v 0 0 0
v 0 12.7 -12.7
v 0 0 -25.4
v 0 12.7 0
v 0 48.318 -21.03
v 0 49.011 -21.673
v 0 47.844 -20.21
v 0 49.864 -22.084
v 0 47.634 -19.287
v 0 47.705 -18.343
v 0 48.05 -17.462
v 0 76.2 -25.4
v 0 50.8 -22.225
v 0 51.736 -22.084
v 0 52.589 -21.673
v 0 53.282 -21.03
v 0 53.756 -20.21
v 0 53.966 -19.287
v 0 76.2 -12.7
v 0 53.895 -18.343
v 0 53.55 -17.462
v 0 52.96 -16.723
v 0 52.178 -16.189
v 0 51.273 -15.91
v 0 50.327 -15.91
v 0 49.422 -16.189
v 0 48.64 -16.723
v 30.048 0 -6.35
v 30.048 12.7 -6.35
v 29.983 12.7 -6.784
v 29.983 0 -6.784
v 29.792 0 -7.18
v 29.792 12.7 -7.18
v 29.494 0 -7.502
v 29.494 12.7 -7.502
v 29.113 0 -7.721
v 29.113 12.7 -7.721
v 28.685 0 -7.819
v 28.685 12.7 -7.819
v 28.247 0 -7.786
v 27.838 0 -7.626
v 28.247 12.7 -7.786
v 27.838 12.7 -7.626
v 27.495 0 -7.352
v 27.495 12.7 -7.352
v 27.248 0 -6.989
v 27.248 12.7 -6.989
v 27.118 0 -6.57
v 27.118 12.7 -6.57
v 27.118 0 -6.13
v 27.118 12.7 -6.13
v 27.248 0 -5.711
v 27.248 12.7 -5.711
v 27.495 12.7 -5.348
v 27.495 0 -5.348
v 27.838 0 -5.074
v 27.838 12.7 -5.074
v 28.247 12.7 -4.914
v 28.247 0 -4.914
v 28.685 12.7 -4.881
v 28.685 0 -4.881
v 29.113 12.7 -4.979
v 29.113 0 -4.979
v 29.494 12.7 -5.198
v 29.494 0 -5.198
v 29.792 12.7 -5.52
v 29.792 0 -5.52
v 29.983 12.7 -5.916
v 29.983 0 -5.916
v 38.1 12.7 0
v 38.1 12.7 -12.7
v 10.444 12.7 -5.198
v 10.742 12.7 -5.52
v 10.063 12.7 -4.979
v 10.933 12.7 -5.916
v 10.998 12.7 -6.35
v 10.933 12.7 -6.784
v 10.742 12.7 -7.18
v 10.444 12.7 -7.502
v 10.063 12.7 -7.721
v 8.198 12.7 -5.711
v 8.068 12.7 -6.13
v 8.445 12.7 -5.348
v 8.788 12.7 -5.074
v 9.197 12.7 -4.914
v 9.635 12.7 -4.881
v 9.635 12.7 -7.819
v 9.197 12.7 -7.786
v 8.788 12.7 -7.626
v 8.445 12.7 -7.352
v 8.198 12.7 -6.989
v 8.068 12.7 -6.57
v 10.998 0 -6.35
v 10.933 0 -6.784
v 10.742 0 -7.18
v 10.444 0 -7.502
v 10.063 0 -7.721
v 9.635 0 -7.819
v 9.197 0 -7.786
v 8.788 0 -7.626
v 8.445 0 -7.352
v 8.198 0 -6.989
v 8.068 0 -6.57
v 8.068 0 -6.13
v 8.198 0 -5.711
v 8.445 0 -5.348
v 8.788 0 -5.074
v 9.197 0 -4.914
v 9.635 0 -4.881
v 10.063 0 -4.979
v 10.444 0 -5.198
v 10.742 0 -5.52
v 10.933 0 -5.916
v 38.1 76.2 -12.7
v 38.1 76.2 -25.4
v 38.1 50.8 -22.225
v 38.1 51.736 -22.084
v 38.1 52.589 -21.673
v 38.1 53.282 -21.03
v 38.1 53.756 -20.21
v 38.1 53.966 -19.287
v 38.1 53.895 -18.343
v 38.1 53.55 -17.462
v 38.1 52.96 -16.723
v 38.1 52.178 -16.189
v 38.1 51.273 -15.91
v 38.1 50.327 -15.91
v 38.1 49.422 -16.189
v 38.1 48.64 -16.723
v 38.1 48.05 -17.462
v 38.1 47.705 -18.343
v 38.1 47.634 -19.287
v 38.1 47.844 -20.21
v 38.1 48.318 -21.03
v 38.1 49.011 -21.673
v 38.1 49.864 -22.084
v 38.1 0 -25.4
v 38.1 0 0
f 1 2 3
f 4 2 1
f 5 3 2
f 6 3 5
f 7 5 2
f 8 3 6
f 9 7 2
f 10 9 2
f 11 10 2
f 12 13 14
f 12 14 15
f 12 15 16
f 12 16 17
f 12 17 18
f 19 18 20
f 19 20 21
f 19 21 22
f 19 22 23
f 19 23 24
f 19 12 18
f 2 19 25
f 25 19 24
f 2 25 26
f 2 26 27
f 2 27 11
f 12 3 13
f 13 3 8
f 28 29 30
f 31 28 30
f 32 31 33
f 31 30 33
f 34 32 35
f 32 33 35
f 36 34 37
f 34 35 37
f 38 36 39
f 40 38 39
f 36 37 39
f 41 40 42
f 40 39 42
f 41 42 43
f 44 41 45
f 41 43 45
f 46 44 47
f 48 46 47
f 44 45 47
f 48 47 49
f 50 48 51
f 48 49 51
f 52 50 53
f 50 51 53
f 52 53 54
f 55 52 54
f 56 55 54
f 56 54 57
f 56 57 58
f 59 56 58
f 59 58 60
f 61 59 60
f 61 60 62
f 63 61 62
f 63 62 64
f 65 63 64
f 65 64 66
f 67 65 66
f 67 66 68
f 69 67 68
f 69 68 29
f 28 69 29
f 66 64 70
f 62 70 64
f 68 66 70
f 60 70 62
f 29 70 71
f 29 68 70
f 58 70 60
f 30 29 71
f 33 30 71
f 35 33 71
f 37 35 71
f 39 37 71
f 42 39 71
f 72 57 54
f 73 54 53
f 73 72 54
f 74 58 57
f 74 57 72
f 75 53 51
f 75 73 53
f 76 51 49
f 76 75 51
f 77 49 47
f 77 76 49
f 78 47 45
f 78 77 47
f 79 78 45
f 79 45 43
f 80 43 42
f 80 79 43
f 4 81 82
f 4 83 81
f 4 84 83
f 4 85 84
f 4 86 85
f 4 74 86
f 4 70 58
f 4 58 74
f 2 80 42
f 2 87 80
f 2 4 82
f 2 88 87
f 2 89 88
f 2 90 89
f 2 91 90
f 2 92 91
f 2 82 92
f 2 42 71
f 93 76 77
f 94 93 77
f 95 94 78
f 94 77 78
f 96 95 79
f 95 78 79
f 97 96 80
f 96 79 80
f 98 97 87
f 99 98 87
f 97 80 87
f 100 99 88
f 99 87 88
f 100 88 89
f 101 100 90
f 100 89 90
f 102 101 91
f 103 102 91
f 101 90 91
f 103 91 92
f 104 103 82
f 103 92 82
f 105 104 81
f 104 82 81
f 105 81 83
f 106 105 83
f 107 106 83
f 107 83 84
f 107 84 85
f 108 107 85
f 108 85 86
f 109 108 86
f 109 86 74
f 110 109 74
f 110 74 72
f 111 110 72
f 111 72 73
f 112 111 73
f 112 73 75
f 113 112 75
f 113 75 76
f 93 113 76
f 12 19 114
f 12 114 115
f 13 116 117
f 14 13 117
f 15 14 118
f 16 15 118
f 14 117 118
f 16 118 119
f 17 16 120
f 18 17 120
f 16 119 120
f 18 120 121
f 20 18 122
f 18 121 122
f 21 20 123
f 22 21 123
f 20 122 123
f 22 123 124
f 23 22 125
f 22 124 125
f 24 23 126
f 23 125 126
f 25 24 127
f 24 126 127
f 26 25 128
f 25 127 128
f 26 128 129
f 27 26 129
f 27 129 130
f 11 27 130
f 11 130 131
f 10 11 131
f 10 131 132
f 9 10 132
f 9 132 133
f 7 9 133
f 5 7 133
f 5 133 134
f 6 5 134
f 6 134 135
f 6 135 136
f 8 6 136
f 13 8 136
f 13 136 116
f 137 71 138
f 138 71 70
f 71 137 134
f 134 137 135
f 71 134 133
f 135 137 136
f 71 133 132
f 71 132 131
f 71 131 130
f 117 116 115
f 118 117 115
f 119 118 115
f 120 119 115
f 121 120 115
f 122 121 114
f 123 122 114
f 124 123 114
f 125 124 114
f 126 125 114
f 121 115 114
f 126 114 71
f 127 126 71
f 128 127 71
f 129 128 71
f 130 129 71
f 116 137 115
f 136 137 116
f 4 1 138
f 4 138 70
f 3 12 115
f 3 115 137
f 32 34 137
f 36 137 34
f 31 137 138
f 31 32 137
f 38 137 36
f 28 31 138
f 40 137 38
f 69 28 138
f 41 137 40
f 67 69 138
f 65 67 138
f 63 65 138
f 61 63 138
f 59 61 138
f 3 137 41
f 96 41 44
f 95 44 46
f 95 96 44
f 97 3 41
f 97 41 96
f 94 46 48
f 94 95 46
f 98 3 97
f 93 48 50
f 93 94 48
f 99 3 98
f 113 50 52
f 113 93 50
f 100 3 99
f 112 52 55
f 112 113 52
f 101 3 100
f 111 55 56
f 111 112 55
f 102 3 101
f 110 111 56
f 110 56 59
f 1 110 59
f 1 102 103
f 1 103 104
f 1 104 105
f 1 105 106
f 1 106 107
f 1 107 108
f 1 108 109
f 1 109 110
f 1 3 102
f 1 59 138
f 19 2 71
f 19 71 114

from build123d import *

# Parameters (mm, degrees)
BOSS_EXTRUDE1_DEPTH = 38.1
SKETCH2_R           = 3.175
CUT_EXTRUDE1_DEPTH  = 39.1
SKETCH3_R           = 1.4732
CUT_EXTRUDE2_DEPTH  = 13.7


with BuildPart() as part:
    # Sketch1 → Boss-Extrude1 (new body)
    with BuildSketch(Plane(origin=(0, 0, 0), x_dir=(0, 0, -1), z_dir=(1, 0, 0))):
        Polygon((0, 0), (0, 12.7), (12.7, 12.7), (12.7, 76.2), (25.4, 76.2), (25.4, 0), align=None)
    extrude(amount=BOSS_EXTRUDE1_DEPTH)

    # Sketch2 → Cut-Extrude1 (cut, through all)
    with BuildSketch(Plane(origin=(38.1, 0, 0), x_dir=(0, 0, -1), z_dir=(1, 0, 0))):
        with Locations((19.05, 50.8)):
            Circle(SKETCH2_R)
    extrude(amount=-CUT_EXTRUDE1_DEPTH, mode=Mode.SUBTRACT)

    # Sketch3 → Cut-Extrude2 (cut, through all)
    with BuildSketch(Plane(origin=(0, 12.7, 0), x_dir=(1, 0, 0), z_dir=(0, 1, 0))):
        with Locations((9.525, 6.35)):
            Circle(SKETCH3_R)
        with Locations((28.575, 6.35)):
            Circle(SKETCH3_R)
    extrude(amount=-CUT_EXTRUDE2_DEPTH, mode=Mode.SUBTRACT)


solid = part.part
